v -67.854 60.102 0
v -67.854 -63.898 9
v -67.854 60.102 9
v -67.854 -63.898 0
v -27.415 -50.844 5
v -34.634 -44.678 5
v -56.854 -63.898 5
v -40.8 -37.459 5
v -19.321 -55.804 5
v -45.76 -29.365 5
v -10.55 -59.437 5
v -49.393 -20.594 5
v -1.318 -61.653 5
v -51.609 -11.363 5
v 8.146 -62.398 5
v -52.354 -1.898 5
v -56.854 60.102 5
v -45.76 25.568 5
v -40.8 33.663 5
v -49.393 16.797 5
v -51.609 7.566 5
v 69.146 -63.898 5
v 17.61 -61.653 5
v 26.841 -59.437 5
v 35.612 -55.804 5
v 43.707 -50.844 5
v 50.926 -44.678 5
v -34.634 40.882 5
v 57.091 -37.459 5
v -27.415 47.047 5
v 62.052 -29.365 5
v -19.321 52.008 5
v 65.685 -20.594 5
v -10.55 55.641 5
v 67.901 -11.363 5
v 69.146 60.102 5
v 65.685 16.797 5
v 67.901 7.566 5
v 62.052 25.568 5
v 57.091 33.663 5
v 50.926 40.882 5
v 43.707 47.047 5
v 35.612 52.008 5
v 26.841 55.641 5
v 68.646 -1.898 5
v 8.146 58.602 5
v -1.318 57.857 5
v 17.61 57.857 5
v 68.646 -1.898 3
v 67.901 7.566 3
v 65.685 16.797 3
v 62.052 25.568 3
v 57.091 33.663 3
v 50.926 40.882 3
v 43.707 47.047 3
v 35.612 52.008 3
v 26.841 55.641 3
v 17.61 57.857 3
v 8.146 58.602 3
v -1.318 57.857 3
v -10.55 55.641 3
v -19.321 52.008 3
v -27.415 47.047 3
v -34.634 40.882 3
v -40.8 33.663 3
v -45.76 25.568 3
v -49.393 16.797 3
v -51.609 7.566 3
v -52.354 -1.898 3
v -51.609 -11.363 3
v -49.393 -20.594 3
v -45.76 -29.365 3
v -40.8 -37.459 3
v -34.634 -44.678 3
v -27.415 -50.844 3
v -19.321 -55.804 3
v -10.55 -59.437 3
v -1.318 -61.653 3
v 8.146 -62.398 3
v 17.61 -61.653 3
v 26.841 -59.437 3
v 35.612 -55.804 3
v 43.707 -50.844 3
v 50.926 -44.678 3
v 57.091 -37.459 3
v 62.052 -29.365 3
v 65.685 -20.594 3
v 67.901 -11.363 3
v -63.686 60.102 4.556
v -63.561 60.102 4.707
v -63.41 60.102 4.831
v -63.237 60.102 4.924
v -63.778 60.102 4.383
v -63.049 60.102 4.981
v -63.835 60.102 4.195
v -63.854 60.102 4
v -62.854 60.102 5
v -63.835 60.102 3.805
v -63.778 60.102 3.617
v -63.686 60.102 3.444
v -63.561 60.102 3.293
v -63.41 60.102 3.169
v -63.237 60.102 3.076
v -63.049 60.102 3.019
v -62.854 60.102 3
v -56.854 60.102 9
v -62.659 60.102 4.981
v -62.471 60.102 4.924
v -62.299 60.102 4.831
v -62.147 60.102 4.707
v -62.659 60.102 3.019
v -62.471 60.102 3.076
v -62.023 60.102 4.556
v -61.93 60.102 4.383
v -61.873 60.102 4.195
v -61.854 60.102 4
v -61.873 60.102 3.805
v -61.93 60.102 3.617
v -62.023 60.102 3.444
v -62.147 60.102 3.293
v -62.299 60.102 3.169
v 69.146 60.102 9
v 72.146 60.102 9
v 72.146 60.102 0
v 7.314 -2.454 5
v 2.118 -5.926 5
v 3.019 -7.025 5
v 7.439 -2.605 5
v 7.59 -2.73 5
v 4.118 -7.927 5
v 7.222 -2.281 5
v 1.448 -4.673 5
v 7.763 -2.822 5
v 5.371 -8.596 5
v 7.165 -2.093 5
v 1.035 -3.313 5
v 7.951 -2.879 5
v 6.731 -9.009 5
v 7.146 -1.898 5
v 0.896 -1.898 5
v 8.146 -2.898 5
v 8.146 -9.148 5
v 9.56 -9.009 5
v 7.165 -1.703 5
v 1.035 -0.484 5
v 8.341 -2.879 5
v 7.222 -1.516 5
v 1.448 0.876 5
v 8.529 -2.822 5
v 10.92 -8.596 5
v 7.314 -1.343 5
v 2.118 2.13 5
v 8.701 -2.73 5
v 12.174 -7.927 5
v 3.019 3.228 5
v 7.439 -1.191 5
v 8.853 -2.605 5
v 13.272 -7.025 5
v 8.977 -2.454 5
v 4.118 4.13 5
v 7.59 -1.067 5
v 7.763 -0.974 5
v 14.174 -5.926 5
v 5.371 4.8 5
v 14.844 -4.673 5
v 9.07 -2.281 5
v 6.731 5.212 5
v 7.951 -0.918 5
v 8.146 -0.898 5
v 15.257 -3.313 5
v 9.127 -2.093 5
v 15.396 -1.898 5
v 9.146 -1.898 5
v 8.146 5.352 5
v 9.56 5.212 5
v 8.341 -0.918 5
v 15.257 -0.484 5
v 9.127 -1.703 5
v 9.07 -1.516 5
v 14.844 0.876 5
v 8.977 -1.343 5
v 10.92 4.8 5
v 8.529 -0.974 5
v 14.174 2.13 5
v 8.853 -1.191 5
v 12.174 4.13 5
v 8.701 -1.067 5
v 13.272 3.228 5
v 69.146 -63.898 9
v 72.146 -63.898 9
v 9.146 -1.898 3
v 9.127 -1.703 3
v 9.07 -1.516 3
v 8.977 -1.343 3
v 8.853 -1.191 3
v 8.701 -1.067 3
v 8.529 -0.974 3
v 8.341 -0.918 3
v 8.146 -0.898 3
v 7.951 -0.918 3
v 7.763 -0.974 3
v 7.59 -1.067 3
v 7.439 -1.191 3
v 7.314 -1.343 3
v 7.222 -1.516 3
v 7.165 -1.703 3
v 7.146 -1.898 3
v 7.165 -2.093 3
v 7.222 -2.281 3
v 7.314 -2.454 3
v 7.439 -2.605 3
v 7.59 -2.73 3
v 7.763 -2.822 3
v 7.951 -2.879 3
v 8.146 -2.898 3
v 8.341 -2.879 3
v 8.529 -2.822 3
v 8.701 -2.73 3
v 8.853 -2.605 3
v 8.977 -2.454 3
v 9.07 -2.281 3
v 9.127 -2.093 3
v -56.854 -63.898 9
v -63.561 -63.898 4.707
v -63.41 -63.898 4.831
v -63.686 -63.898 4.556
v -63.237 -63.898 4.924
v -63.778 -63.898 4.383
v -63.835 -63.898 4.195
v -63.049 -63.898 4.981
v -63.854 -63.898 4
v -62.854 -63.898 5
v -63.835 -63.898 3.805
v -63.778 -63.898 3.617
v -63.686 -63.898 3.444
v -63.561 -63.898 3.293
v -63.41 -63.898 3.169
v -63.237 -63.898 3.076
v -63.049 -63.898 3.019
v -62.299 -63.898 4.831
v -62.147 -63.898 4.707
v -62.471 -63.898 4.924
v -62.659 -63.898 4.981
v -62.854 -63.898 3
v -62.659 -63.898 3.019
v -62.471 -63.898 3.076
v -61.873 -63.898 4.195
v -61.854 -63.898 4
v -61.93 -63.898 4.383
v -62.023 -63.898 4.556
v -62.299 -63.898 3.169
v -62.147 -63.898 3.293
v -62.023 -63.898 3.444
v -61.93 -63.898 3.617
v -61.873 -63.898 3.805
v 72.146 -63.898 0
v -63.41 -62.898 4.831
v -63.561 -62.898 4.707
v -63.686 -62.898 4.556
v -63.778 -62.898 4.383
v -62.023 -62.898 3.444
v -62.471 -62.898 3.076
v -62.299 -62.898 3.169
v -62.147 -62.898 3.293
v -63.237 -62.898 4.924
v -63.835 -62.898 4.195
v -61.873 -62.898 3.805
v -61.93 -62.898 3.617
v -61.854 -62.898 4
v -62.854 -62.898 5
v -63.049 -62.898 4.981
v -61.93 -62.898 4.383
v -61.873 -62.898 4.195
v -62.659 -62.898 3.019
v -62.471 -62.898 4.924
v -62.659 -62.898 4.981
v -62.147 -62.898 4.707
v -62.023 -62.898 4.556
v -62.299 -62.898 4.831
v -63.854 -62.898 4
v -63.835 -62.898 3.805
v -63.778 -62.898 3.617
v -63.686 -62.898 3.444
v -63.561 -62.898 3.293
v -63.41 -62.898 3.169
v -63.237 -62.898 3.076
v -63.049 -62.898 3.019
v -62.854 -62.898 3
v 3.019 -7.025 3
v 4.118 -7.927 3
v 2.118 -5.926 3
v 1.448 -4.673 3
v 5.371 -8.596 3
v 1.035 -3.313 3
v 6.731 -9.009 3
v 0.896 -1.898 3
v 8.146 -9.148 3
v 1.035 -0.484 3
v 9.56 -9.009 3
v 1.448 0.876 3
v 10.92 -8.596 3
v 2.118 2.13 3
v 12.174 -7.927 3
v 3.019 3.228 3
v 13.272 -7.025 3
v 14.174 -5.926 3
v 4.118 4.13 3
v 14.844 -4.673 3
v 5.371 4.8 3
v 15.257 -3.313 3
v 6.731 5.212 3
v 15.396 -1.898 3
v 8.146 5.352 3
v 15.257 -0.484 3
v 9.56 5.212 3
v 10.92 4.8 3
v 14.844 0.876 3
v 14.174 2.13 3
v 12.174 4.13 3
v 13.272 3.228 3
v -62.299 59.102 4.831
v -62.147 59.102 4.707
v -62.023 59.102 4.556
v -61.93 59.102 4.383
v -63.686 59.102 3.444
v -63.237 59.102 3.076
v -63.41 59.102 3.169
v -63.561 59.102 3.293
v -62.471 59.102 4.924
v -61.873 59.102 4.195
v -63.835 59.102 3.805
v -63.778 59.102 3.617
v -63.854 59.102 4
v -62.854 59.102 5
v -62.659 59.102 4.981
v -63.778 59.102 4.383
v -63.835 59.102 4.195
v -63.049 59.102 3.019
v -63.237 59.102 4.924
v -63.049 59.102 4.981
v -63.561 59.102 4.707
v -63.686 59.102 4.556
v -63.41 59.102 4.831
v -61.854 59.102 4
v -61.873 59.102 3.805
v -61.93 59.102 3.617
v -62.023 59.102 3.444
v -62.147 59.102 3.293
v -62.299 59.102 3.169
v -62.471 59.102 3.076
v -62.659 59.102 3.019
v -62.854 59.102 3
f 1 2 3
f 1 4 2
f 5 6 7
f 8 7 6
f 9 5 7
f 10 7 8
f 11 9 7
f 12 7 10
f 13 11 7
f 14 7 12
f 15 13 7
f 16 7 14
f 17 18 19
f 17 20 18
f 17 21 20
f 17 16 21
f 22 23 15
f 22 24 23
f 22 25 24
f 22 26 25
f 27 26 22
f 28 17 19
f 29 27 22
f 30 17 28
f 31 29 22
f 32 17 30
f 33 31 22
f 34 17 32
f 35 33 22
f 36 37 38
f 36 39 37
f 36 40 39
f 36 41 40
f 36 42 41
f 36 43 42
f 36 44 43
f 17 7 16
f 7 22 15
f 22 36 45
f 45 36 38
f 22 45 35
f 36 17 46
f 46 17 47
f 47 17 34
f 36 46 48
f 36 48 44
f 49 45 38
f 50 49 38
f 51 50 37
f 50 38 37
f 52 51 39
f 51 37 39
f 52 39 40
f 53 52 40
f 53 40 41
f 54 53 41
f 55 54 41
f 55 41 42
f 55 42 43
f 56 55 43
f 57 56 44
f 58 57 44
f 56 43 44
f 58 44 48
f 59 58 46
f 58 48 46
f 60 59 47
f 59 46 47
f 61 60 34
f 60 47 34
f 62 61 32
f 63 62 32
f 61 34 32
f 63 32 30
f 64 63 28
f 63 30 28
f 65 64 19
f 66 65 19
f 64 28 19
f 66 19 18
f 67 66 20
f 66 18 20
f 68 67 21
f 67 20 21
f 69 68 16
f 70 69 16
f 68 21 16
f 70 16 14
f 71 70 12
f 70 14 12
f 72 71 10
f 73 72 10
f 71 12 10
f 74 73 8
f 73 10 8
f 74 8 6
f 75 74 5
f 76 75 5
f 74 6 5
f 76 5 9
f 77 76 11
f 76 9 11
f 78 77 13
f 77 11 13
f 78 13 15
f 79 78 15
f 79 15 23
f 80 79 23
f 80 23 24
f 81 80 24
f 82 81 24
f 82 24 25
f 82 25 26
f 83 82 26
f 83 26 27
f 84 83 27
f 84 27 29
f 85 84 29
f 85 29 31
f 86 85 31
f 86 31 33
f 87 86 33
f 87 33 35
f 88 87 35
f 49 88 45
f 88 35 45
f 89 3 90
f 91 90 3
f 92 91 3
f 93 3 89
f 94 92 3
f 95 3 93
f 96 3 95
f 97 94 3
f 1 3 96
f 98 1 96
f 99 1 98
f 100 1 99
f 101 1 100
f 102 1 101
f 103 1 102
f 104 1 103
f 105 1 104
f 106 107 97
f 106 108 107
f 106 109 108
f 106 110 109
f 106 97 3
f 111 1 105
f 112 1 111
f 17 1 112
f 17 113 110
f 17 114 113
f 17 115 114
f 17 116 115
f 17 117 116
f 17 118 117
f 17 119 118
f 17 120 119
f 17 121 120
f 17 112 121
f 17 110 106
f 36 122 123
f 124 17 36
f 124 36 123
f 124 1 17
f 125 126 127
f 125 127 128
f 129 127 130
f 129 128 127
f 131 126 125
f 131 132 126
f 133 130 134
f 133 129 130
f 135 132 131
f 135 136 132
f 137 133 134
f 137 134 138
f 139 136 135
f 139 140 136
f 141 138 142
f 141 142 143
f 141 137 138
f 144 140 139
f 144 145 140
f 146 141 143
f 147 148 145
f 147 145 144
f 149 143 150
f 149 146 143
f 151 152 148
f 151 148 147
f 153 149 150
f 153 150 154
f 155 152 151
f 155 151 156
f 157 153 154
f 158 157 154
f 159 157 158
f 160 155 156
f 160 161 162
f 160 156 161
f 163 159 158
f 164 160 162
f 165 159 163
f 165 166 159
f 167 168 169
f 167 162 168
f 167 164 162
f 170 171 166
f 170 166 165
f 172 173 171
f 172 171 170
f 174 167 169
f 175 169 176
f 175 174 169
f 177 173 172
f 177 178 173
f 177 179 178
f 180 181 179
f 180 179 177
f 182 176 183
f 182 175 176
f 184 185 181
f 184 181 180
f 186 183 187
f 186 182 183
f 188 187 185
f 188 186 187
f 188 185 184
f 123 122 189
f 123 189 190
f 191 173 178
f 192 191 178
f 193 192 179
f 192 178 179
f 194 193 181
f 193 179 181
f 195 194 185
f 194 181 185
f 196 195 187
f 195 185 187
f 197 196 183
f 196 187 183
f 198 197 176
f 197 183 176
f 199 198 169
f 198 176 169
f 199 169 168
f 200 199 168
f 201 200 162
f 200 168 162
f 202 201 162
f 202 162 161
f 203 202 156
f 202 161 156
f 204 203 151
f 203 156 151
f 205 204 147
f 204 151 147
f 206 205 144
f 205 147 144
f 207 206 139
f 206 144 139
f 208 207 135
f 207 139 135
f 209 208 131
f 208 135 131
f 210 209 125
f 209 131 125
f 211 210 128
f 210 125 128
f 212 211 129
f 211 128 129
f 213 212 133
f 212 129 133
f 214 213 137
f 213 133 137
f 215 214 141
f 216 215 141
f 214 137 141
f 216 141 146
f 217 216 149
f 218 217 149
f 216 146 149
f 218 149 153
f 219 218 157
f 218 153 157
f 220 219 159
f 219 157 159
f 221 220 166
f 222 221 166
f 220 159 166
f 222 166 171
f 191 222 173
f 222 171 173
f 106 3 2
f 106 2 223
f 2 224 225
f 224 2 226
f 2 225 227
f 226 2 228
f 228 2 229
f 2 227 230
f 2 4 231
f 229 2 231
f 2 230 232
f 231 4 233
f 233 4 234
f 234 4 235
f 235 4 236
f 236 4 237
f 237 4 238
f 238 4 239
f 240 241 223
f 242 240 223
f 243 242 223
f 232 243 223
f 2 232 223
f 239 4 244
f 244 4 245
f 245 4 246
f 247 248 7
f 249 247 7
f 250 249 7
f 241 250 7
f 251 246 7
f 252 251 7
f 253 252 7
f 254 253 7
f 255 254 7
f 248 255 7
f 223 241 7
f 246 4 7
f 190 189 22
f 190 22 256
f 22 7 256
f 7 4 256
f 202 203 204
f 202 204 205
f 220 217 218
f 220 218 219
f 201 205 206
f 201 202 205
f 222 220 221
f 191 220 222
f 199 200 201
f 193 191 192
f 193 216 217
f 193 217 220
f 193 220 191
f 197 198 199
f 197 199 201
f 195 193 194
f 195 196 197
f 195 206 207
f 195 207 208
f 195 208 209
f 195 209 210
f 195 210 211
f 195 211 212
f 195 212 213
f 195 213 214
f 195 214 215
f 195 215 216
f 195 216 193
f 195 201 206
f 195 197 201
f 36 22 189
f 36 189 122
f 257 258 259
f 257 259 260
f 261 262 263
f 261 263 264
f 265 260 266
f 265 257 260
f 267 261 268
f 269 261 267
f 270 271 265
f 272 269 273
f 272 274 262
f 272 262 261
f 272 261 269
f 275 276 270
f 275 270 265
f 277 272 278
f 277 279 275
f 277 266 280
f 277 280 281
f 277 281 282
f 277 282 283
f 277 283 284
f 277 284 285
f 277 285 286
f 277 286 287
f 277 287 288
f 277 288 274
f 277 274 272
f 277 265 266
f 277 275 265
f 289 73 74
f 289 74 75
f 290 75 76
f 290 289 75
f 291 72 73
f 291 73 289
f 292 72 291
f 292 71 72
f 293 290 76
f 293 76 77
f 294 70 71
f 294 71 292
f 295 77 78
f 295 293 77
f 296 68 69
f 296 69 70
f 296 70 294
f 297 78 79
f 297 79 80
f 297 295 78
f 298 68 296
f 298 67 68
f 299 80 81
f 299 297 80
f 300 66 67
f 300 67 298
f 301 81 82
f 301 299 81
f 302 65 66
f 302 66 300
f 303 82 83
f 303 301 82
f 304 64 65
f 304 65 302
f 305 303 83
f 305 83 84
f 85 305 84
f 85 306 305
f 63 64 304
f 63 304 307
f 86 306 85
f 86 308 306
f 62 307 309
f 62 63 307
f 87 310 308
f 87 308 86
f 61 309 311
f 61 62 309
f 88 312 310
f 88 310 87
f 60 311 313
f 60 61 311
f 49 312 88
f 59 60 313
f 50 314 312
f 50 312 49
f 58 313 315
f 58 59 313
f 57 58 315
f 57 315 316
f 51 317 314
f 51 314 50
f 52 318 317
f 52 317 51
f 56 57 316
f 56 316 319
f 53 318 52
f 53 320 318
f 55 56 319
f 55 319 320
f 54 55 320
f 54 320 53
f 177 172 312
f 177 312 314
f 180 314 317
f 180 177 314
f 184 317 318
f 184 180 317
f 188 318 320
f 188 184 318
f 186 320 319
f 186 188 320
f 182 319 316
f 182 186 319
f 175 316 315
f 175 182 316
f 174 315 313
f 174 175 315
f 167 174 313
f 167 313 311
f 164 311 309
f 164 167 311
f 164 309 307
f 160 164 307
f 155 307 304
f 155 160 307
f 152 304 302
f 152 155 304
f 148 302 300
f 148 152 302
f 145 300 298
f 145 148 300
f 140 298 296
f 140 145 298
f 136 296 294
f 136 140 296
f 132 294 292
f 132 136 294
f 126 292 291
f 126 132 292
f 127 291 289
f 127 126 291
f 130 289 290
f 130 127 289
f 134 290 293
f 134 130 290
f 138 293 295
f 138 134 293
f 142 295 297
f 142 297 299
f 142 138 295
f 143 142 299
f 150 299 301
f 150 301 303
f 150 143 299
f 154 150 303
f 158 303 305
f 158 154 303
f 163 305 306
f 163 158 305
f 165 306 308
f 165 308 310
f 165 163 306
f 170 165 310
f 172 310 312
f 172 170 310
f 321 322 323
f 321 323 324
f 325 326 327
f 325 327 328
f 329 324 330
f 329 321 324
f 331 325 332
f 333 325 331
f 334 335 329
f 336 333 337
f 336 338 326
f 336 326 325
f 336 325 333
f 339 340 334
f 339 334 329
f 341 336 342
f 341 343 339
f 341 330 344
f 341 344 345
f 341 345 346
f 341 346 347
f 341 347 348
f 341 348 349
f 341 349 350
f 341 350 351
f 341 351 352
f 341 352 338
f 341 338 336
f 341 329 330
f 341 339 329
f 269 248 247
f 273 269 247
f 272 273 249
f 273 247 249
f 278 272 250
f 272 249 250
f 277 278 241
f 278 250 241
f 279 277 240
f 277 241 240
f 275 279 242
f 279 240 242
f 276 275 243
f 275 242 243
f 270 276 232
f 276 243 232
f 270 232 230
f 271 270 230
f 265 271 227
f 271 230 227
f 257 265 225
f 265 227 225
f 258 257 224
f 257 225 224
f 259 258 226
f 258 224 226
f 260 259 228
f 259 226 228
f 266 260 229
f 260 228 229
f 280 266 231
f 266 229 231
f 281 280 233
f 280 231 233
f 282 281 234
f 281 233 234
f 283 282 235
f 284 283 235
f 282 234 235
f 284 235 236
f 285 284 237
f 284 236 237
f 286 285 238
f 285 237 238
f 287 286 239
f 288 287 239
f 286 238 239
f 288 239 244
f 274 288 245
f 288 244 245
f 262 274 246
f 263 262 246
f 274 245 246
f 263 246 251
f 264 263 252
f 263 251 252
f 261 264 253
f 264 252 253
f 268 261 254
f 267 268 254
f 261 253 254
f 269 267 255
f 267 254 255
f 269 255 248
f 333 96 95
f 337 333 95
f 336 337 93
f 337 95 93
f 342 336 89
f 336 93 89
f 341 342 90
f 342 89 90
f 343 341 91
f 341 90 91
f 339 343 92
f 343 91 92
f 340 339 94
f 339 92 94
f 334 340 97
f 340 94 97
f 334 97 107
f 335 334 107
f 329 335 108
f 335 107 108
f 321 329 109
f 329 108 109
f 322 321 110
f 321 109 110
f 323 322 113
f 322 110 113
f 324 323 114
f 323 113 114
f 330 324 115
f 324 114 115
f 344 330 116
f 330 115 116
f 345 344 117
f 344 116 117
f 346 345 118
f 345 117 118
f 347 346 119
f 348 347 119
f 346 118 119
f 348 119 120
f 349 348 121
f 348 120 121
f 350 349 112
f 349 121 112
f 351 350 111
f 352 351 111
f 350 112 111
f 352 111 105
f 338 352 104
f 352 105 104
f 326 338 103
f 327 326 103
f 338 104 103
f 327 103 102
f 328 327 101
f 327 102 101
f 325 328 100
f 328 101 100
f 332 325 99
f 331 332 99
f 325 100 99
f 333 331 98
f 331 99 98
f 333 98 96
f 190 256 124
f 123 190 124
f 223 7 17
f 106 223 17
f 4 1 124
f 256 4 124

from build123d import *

# Parameters (mm, degrees)
F0_W     = 140
F0_H     = 124
F1_DEPTH = 5
F2_W     = 11
F2_H     = 124
F2_W_2   = 3
F3_DEPTH = 4
F4_R     = 60.5
F4_R_2   = 7.25
F4_R_3   = 1
F5_DEPTH = 2
F6_R     = 1
F7_DEPTH = 1
F8_R     = 1
F9_DEPTH = 1


with BuildPart() as f1:
    # F0 (on Top) → F1 (new body)
    with BuildSketch(Plane.XY):
        with Locations((2.145864, -1.898353)):
            Rectangle(F0_W, F0_H)
    extrude(amount=F1_DEPTH)

    # F2 (on face) → F3 (join)
    with BuildSketch(Plane.XY.offset(5)):
        with Locations((-62.354136, -1.898353)):
            Rectangle(F2_W, F2_H)
        with Locations((70.645864, -1.898353)):
            Rectangle(F2_W_2, F2_H)
    extrude(amount=F3_DEPTH)

    # F4 (on face) → F5 (cut)
    with BuildSketch(Plane.XY.offset(5)):
        with Locations((8.145864, -1.898353)):
            Circle(F4_R)
        with Locations((8.145864, -1.898353)):
            Circle(F4_R_2, mode=Mode.SUBTRACT)
        with Locations((8.145864, -1.898353)):
            Circle(F4_R_3)
    extrude(amount=-F5_DEPTH, mode=Mode.SUBTRACT)

    # F6 (on face) → F7 (cut)
    with BuildSketch(Plane.XZ.offset(63.898353)):
        with Locations((-62.854134, 4)):
            Circle(F6_R)
    extrude(amount=-F7_DEPTH, mode=Mode.SUBTRACT)

    # F8 (on face) → F9 (cut)
    with BuildSketch(Plane(origin=(0, 60.101647, 0), x_dir=(-1, 0, 0), z_dir=(0, 1, 0))):
        with Locations((62.854136, 4)):
            Circle(F8_R)
    extrude(amount=-F9_DEPTH, mode=Mode.SUBTRACT)


solid = f1.part
